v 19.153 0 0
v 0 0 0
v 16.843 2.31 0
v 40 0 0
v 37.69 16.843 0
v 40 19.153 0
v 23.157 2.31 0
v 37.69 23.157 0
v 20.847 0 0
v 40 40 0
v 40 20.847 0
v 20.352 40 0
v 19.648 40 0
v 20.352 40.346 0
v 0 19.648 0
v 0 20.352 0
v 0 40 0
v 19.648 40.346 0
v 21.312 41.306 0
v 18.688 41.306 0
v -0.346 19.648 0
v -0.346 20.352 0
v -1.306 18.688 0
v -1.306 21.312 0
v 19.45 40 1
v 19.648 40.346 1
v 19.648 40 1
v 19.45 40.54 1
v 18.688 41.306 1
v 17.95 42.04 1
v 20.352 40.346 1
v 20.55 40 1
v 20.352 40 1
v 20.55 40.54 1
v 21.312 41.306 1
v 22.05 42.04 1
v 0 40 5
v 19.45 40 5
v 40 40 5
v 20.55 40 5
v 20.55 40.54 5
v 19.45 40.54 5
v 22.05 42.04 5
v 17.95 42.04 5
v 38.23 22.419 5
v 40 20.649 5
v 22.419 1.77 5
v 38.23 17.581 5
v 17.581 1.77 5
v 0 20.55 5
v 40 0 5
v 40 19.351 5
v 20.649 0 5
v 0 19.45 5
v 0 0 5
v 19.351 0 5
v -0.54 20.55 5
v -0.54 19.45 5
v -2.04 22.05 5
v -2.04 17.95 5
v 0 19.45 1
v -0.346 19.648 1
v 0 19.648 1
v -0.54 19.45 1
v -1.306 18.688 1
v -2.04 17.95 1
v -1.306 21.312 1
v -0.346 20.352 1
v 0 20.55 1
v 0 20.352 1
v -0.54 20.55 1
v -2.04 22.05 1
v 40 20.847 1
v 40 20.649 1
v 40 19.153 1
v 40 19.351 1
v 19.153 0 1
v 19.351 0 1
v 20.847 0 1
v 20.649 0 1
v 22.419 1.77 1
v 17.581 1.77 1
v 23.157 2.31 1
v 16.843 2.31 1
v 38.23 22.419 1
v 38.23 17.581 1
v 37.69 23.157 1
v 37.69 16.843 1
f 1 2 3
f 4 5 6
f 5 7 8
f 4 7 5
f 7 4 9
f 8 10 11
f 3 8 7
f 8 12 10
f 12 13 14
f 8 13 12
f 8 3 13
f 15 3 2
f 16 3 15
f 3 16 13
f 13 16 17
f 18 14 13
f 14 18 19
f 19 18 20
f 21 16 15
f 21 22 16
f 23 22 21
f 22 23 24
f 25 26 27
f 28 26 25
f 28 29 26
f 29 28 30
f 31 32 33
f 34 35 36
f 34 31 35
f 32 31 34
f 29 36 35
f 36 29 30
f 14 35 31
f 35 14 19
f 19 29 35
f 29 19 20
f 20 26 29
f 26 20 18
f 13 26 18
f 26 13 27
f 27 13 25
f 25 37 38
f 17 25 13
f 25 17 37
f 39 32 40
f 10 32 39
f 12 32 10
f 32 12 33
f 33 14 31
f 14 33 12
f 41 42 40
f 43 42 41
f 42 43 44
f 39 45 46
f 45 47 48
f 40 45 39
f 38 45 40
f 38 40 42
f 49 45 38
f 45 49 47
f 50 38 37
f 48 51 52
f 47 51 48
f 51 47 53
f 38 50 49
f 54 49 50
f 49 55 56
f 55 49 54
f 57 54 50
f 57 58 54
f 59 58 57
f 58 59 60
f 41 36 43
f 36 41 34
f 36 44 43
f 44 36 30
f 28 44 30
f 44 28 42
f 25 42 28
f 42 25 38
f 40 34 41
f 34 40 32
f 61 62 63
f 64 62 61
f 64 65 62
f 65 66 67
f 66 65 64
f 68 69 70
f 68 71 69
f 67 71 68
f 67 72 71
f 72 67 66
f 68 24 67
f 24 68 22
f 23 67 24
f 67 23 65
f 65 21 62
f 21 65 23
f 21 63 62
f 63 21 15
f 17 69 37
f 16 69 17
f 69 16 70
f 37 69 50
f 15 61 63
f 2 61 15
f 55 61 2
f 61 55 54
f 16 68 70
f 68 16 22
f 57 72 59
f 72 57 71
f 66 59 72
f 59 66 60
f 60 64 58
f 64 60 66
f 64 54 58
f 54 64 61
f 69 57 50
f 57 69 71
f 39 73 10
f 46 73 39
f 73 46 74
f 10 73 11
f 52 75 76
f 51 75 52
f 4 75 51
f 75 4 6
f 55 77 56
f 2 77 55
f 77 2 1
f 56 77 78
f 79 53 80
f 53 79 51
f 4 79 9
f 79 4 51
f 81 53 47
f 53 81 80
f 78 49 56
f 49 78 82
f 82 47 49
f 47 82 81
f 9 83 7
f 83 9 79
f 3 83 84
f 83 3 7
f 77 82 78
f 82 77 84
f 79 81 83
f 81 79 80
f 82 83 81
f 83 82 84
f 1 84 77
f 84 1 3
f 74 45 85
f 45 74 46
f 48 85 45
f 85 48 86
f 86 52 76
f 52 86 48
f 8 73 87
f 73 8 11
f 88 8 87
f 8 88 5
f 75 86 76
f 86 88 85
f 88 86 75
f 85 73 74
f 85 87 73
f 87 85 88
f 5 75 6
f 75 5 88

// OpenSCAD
// file: interlockingmodule.scad
//this section defines a module for creating a "rounded" bottom to the box, useful when storing small parts
module RoundBottom(width, length, height){    
    translate([0,length,0])rotate([90,0,0])
    linear_extrude(length, center=false)
    
    difference() {
        translate([-width/2,0,0])square([width,height/2],center=false);
        translate([0,height/2,0])resize([width,height]) circle(d=width*10);
    }
}


module interlockingbox(
    //Box Width in units
    BoxWidthUnits = 3,
    //Box Length in units
    BoxLengthUnits = 3,
    //Box Height in mm
    BoxHeight = 120,
    //Box Floor Thickness in mm
    BoxFloor = 2,
    //North Wall open or closed
    NorthWallOpen = 0, // [0:Closed, 1:Open]
    //South Wall open or closed
    SouthWallOpen = 0 // [0:Closed, 1:Open]
)
{
echo(version=version(2.0));
//comments: Version 2 adds anti-"elephant foot" scaling at bottom of dovetail sections
/* [Size] */
//Box unit size in mm. This defines the size of 1 'unit' for your box.
BoxUnits = 40;
BoxWidth = BoxWidthUnits * BoxUnits;
BoxLength = BoxLengthUnits * BoxUnits;
//Box Wall Thickness in mm
BoxWall = 1;
//Fit Factor. Greater factor = looser fit
FitFactor = 0.18;  // [0:0.05:0.4]
//RoundedBottom = "EW"; // [EW:East-West, NS:North-South]
RoundedBottom = ""; // [EW:East-West, NS:North-South]

/* [Walls] */

/* [Dovetail] */
//Dovetail inside length in mm
DTInsideLength = 1.1;
//Dovetail angle in degrees
DTAngle = 45;
//Dovetail width in mm
DTWidth = 1.5;

/* [Hidden] */
//This helps calculate the length of the 'long' side of the dovetail
DTx=tan(DTAngle)*DTWidth;
//This polygon defines the dovetail shape
DTShape = [[0,0],[DTInsideLength/2,0],[DTInsideLength/2+DTx,DTWidth],[-DTInsideLength/2-DTx,DTWidth],[-DTInsideLength/2,0]];



union(){
    //creates and transforms rounded bottom
    if (RoundedBottom=="EW") {
    translate([0,(BoxWidth/2)+BoxWall,BoxFloor])
    rotate([0,0,-90])
    RoundBottom(BoxWidth-DTWidth-(BoxWall),BoxLength-DTWidth-BoxWall,2*(BoxHeight-BoxFloor));
    }

    //creates rounded bottom oriented North-South
    if (RoundedBottom=="NS") {
    translate([(BoxLength/2)-BoxWall,DTWidth+BoxWall/2,BoxFloor])
    rotate([0,0,0])
    RoundBottom(BoxLength-DTWidth-(BoxWall),BoxWidth-DTWidth-BoxWall,2*(BoxHeight-BoxFloor));
    }

    //Creates main box,without round bottom
    difference(){
        
    union(){
        //main box
    cube([BoxLength,BoxWidth,BoxHeight], center=false);

        //male dovetails
    for (i=[1:BoxLengthUnits])
    translate([(i-1)*BoxUnits+(BoxUnits/2),BoxWidth,0])
        //in 2 sections. first section is slightly scaled down to counter "elephant foot"
        union(){
            linear_extrude(height=1, center=false)
                scale([1-(2*FitFactor),1-(2*FitFactor),1])
                union(){        
                    //this adds a slight offset to the male dovetail for a looser fit
                    translate([-DTInsideLength/2,0,0])
                    square([DTInsideLength,DTWidth]);
                    //main dovetail shape
                    translate([0,DTWidth*FitFactor*2,0])
                    polygon(DTShape);
                };
            translate([0,0,1])
            linear_extrude(height=BoxHeight-1, center=false)
                    union(){
                    //this adds a slight offset to the male dovetail for a looser fit
                    translate([-DTInsideLength/2,0,0])
                    square([DTInsideLength,DTWidth]);
                    //main dovetail shape
                    translate([0,DTWidth*FitFactor*2,0])
                    polygon(DTShape);
                    };
        }        

    for (i=[1:BoxWidthUnits])
    translate([0,(i-1)*BoxUnits+(BoxUnits/2),0])
        //in 2 sections. first section is slightly scaled down to counter "elephant foot"
        rotate([0,0,90])
        union(){
            linear_extrude(height=1, center=false)				//1mm high anti-elephant foot section
                scale([1-(2*FitFactor),1-(2*FitFactor),1])
                union(){        
                    //this adds a slight offset to the male dovetail for a looser fit
                    translate([-DTInsideLength/2,0,0])
                    square([DTInsideLength,DTWidth]);
                    //main dovetail shape
                    translate([0,DTWidth*FitFactor*2,0])
                    polygon(DTShape);
                };
            translate([0,0,1])
            linear_extrude(height=BoxHeight-1, center=false)
                union(){
                    //male dovetail offset
                    translate([-DTInsideLength/2,0,0])
                    square([DTInsideLength,DTWidth]);
                    //main dovetail shape
                    translate([0,DTWidth*FitFactor*2,0])
                    polygon(DTShape);
                };
        }
    }
    //female dovetails
    for (i=[1:BoxLengthUnits])
        union(){
            translate([(i-1)*BoxUnits+(BoxUnits/2),0,0])
                scale([1+FitFactor,1+FitFactor,1])
                linear_extrude(height=BoxHeight, center=false)
                polygon(DTShape);
        
            //added a second dovetail cutout at the bottom, scaled up to counter "elephant foot" when printed
            translate([(i-1)*BoxUnits+(BoxUnits/2),0,0])
                scale([1+(3*FitFactor),1+(3*FitFactor),1])
                linear_extrude(height=1, center=false)
                polygon(DTShape);					
        }

    for (i=[1:BoxWidthUnits])
        union(){
            translate([BoxLength,(i-1)*BoxUnits+(BoxUnits/2),0])
                rotate([0,0,90])
                    scale([1+FitFactor,1+FitFactor,1])
                        linear_extrude(height=BoxHeight, center=false)
                            polygon(DTShape);
            //added a second dovetail cutout at the bottom, scaled up to counter "elephant foot" when printed
            translate([BoxLength,(i-1)*BoxUnits+(BoxUnits/2),0])
                rotate([0,0,90])
                    scale([1+(3*FitFactor),1+(3*FitFactor),1])
                        linear_extrude(height=1, center=false)
                            polygon(DTShape);	
        }
    //carves out main box
    translate([BoxWall,DTWidth+BoxWall,BoxFloor])
        cube([BoxLength-(2*BoxWall)-DTWidth, (BoxWidth-(2*BoxWall)-DTWidth), BoxHeight]);

    if (NorthWallOpen)
        translate([-DTWidth*(1+FitFactor+FitFactor),BoxWall+DTWidth,BoxFloor])
            cube([BoxWall+(DTWidth*(1+FitFactor+FitFactor)), (BoxWidth-(2*BoxWall)-DTWidth), BoxHeight]);    

    if (SouthWallOpen)
        translate([BoxLength-(BoxWall)-DTWidth,BoxWall+DTWidth,BoxFloor])
            cube([BoxWall+DTWidth, (BoxWidth-(2*BoxWall)-DTWidth), BoxHeight]);

    }
  }
}

// Cutout to make sure the actual box with groves is properly printed
// Use this with difference() to remove trim internal to fit the box.
module negativeBox(
    //Box Width in units
    BoxWidthUnits = 3,
    //Box Length in units
    BoxLengthUnits = 3,
    //Box Height in mm
    BoxHeight = 120,
    //Box unit size in mm. This defines the size of 1 'unit' for your box.
    BoxUnits = 40,
)
{
    difference () {
        translate([-5,-3,0])
        cube([BoxLengthUnits*BoxUnits+8,BoxWidthUnits*BoxUnits+8,BoxHeight]);

    translate([0.5,2,0])
        cube([BoxLengthUnits*BoxUnits-2.5,BoxWidthUnits*BoxUnits-2.5,BoxHeight]);
    }
}

interlockingbox(2,3,40);

// This will create a sliver of a wall if working properly
//difference() {
//    interlockingbox(2,3,40);
//    negativeBox(2,3,40);
//}
// main file
use <interlockingmodule.scad>

// spacer to fill out drawer

$fn=120;
OverExtrusion = 0.2;

height=5;
interval = 12.5;
diameter=10.2+2*OverExtrusion;

BoxUnits=40;
BoxWidthUnits=1;
BoxLengthUnits=1;

WallAdjust = 1;

difference () {
interlockingbox(
    //Box Width in units
    BoxWidthUnits = BoxWidthUnits,
    //Box Length in units
    BoxLengthUnits = BoxLengthUnits,
    //Box Height in mm
    BoxHeight = height,
    //Box Floor Thickness in mm
    BoxFloor = height+0.01
);

}
